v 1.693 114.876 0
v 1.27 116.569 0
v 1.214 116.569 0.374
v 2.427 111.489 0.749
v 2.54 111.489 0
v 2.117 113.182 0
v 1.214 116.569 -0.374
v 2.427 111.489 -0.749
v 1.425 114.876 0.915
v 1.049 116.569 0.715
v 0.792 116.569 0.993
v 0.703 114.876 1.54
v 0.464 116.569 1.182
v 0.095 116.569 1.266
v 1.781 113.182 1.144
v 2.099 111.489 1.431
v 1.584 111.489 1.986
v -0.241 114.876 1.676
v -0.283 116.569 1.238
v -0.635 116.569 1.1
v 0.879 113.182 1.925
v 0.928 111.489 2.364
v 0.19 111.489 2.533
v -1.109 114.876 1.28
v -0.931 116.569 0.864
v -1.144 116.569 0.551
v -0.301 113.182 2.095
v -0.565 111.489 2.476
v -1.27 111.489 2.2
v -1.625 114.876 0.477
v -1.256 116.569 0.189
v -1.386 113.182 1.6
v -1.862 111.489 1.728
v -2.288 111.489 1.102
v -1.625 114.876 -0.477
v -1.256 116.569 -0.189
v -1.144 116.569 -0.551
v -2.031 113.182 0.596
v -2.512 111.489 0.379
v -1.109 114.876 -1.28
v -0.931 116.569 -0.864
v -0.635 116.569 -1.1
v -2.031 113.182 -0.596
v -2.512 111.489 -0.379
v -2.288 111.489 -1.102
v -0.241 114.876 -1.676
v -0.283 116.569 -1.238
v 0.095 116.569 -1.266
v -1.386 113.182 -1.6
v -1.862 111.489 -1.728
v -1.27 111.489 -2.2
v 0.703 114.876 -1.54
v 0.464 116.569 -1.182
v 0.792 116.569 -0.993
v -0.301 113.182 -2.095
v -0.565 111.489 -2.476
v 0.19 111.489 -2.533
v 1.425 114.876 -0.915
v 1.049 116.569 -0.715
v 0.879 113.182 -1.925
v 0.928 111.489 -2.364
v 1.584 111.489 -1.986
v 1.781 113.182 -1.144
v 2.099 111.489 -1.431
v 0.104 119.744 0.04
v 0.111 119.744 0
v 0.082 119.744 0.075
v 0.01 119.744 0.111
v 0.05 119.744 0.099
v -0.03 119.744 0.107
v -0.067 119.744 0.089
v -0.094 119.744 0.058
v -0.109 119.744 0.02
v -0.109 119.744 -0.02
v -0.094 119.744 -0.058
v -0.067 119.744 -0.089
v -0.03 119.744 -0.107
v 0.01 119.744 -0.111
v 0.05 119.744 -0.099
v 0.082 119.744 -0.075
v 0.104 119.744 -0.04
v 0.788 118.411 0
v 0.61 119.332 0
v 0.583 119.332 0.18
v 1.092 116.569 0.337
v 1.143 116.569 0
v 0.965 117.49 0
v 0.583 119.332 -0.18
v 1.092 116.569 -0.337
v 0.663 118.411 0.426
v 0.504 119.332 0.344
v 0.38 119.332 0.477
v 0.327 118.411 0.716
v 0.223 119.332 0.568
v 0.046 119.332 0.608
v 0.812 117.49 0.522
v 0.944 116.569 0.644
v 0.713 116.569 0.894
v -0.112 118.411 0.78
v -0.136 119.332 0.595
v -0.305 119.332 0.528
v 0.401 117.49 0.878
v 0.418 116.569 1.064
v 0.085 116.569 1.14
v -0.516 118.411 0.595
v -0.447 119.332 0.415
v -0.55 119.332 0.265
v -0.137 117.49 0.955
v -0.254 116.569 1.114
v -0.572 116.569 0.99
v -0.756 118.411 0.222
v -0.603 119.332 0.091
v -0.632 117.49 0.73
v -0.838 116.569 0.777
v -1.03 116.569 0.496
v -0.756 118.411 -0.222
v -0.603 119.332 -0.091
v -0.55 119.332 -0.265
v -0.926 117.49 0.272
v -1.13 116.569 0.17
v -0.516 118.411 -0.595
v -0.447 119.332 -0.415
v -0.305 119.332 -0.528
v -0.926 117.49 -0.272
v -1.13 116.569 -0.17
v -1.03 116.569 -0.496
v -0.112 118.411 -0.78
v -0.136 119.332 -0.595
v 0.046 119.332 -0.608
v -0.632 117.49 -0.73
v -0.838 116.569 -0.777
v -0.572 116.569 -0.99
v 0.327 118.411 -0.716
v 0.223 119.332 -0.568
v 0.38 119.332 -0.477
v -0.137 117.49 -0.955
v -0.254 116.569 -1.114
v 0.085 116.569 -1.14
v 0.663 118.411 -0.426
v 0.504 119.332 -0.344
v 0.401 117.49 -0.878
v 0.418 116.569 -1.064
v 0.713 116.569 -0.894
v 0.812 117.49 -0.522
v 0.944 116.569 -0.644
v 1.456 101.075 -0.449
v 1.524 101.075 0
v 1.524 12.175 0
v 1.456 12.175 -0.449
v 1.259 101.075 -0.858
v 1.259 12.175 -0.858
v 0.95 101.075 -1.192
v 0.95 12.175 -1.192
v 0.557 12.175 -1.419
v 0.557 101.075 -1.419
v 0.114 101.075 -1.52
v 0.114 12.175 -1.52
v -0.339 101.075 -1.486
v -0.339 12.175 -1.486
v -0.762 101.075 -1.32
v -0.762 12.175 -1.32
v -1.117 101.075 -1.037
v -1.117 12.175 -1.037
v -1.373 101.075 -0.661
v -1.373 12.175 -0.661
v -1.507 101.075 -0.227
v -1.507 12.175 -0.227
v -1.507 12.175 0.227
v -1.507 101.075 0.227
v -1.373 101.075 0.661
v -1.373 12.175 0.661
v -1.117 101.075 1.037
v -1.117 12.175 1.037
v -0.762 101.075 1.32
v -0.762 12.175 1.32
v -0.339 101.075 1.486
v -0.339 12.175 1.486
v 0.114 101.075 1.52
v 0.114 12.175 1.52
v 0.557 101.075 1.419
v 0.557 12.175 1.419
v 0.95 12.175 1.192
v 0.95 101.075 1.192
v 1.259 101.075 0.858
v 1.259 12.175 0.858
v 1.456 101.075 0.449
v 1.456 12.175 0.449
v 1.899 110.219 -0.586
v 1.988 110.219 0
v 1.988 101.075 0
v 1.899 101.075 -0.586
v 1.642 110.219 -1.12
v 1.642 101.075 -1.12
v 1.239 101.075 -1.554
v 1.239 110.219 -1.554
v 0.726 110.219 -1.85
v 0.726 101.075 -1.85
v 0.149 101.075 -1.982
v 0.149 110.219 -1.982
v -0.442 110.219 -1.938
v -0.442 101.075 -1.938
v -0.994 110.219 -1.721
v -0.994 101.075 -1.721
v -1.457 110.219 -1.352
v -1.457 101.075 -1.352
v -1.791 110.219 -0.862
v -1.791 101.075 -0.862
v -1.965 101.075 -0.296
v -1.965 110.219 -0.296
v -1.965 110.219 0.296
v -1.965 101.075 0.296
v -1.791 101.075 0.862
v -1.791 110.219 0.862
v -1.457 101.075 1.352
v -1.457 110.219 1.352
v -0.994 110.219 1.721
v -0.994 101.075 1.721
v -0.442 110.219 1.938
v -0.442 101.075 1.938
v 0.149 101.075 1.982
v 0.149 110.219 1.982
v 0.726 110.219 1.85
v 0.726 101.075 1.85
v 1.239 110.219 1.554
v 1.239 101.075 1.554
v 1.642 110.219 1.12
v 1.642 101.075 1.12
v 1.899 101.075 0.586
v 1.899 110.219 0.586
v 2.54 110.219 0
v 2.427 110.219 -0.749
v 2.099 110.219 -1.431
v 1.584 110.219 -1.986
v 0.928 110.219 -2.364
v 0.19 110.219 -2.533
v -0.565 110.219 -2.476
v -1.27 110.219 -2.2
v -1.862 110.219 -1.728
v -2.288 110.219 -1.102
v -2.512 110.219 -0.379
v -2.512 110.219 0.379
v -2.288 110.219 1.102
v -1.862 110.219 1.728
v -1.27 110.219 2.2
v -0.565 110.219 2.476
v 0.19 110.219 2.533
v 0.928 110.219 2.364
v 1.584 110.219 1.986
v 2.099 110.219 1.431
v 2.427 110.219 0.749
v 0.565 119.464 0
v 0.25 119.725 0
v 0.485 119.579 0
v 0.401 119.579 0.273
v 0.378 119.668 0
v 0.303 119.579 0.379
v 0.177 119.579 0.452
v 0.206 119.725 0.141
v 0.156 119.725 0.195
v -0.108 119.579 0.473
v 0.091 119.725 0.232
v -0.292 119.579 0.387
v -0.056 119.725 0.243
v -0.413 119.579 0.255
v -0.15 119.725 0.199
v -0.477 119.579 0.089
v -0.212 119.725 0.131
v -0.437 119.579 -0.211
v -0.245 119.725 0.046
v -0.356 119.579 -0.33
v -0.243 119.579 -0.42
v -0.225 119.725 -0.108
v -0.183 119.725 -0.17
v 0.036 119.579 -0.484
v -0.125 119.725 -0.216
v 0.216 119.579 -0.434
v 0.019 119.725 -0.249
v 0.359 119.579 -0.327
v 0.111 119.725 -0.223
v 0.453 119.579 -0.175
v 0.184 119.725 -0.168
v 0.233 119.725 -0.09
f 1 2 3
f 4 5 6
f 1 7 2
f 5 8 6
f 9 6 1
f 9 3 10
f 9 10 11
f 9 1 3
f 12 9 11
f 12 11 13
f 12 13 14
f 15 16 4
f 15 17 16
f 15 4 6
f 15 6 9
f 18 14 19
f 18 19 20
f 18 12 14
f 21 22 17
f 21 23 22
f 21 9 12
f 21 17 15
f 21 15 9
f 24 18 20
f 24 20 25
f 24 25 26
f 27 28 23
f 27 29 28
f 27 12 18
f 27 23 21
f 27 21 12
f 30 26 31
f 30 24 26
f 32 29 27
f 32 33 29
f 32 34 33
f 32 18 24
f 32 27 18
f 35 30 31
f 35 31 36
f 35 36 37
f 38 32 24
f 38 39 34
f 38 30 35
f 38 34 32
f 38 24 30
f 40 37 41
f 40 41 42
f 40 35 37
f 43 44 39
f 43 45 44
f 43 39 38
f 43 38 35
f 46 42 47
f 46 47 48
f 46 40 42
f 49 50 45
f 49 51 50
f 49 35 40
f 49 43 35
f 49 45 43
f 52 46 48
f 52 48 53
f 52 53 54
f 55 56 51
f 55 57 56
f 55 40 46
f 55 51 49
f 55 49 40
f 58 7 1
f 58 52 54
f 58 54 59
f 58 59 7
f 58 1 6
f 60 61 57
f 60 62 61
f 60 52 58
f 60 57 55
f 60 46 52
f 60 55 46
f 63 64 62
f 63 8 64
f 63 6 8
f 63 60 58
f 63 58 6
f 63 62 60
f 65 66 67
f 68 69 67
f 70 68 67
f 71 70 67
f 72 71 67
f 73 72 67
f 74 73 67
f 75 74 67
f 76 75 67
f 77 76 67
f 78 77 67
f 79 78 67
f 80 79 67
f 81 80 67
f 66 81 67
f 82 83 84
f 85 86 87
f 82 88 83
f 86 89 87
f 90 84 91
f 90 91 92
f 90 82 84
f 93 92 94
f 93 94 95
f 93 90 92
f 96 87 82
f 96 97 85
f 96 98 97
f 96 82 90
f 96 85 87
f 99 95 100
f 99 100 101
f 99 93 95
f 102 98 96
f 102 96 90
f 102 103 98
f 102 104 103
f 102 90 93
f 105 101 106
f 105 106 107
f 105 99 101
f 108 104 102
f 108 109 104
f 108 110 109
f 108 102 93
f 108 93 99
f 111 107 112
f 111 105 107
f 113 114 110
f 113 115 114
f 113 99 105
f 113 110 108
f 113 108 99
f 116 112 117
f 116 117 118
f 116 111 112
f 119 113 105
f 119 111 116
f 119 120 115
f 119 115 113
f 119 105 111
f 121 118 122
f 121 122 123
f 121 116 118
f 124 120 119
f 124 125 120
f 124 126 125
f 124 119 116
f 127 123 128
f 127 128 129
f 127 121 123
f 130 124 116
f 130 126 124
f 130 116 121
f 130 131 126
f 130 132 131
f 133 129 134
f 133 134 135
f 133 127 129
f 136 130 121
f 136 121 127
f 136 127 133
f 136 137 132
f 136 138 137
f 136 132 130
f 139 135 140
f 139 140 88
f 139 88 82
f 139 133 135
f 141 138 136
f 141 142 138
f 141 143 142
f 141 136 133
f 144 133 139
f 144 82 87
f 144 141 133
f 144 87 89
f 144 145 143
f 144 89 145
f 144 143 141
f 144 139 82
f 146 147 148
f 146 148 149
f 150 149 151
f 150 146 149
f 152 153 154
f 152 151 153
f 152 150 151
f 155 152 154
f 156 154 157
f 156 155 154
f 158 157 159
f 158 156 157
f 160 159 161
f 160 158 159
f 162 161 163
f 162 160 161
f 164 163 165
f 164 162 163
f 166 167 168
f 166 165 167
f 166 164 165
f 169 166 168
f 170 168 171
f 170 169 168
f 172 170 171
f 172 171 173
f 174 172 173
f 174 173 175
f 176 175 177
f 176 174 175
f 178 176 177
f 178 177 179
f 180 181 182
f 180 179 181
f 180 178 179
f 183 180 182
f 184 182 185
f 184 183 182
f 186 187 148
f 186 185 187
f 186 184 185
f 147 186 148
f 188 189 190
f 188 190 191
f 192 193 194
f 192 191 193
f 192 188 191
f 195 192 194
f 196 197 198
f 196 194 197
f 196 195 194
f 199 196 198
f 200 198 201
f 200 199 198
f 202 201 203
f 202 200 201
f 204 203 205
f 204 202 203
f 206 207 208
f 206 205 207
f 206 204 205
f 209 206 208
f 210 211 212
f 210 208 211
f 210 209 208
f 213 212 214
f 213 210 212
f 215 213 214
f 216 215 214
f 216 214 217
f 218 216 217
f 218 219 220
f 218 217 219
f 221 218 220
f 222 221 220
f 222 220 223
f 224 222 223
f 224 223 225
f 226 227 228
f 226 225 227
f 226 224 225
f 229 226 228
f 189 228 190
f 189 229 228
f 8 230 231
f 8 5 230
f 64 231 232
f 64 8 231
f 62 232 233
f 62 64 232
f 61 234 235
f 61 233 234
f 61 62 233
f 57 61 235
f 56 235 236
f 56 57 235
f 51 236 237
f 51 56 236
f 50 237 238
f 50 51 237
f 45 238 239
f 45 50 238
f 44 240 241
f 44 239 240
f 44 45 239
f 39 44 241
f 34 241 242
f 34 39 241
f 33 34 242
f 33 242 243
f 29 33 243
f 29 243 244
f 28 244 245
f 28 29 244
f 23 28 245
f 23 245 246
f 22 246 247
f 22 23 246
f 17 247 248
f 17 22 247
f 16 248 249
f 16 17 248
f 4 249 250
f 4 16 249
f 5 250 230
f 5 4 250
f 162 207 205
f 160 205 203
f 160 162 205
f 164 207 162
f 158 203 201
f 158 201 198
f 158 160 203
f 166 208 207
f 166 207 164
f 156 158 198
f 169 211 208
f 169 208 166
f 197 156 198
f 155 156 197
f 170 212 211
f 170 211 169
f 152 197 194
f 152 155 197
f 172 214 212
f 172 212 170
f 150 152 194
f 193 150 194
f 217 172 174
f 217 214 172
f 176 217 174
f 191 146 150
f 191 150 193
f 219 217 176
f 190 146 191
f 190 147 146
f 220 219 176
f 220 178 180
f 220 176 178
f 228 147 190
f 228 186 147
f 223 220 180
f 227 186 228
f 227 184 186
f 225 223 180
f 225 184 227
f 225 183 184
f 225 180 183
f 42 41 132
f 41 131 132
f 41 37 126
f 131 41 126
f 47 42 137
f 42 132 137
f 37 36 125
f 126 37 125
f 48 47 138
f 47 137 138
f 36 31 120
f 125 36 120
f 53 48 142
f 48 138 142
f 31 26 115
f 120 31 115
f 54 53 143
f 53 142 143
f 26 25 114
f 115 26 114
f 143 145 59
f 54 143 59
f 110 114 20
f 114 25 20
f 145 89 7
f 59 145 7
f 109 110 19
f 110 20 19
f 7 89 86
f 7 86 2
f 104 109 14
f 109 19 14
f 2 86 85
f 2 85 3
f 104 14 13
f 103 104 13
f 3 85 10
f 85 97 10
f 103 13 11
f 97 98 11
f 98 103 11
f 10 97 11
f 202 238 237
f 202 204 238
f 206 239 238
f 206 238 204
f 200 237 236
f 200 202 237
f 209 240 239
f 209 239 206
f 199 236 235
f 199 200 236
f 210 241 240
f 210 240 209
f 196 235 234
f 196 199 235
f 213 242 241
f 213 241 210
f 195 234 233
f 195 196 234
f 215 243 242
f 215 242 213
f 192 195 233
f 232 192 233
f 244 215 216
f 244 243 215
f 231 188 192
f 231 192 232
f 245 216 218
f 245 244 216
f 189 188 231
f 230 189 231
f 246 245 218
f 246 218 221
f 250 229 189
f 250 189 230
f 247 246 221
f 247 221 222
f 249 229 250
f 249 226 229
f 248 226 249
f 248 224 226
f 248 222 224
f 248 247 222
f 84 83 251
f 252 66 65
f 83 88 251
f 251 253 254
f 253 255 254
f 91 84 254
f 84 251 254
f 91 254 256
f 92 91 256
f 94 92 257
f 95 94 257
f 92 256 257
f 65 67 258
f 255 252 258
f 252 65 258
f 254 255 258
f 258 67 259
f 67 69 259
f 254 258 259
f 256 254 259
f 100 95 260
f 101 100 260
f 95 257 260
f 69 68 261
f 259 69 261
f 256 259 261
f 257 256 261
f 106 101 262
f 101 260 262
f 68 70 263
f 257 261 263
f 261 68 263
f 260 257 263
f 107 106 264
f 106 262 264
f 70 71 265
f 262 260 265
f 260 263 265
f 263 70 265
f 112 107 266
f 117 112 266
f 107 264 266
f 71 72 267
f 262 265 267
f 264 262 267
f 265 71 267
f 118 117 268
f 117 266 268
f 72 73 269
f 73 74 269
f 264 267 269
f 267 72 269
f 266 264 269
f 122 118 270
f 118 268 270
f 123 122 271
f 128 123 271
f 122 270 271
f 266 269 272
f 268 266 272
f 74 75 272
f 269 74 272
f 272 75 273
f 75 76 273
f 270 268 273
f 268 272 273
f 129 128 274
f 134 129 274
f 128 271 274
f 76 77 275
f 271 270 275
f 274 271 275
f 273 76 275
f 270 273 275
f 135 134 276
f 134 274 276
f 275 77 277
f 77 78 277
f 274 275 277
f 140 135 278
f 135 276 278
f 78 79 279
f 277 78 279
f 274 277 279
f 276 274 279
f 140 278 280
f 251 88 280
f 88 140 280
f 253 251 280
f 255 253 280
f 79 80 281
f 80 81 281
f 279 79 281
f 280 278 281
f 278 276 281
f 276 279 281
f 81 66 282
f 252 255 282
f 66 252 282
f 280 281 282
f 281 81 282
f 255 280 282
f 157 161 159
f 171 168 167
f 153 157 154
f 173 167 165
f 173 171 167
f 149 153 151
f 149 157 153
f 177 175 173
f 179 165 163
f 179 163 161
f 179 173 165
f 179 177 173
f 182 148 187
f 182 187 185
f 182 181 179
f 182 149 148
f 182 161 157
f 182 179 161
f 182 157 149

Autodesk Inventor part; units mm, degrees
ref_plane "YZ Plane" through (0, 0, 0) normal (1, 0, 0) x (0, 1, 0)
ref_plane "XZ Plane" through (0, 0, 0) normal (0, 1, 0) x (-1, 0, 0)
ref_plane "XY Plane" through (0, 0, 0) normal (0, 0, 1) x (1, 0, 0)
sketch "Sketch1" plane through (0, 0, 0) normal (0, 0, 1) x (1, 0, 0)
  line L0 (0, 0.1624) -> (0, 12.1749)
  line L1 (0, 12.1749) -> (1.524, 12.1749)
  line L2 (1.524, 12.1749) -> (1.524, 101.0749)
  line L3 (1.524, 101.0749) -> (0, 101.0749)
  line L4 (0, 101.0749) -> (0, 12.1749)
  line L5 (0, 101.0749) -> (1.9875, 101.0749)
  line L6 (1.9875, 101.0749) -> (1.9875, 110.2189)
  line L7 (1.9875, 110.2189) -> (0, 110.2189)
  line L8 (0, 110.2189) -> (0, 101.0749)
  line L9 (0, 110.2189) -> (2.54, 110.2189)
  line L10 (2.54, 110.2189) -> (2.54, 111.4889)
  line L11 (2.54, 111.4889) -> (0, 111.4889)
  line L12 (0, 111.4889) -> (0, 110.2189)
  line L13 (2.54, 111.4889) -> (1.27, 116.5689)
  line L14 (0, 116.5689) -> (0, 111.4889)
  line L15 (0, 116.5689) -> (1.27, 116.5689)
  line L16 (1.143, 116.5689) -> (0.6099, 119.3321)
  line L17 (0, 119.7439) -> (0, 116.5689)
  line L18 (0, 119.7439) -> (0.1111, 119.7439)
  arc A0 (0.6099, 119.3321) -> (0.1111, 119.7439) centre (0.1111, 119.2359) ccw
  point P0 (0, 0)
  point P1 (0.5305, 119.7439)
  dimension "d0" = 1.524
  dimension "d1" = 88.9
  dimension "d2" = 1.9875
  dimension "d3" = 9.144
  dimension "d4" = 2.54
  dimension "d5" = 1.27
  dimension "d6" = 5.08
  dimension "d7" = 1.27
  dimension "d8" = 1.143
  dimension "d9" = 3.175
  dimension "d10" = 0.508
revolve "Revolution1" add sketch "Sketch1" angle 360 about axis through (0, 119.7439, 0) along (0, -1, 0)
properties part number "Ink Barrel + Tip"
